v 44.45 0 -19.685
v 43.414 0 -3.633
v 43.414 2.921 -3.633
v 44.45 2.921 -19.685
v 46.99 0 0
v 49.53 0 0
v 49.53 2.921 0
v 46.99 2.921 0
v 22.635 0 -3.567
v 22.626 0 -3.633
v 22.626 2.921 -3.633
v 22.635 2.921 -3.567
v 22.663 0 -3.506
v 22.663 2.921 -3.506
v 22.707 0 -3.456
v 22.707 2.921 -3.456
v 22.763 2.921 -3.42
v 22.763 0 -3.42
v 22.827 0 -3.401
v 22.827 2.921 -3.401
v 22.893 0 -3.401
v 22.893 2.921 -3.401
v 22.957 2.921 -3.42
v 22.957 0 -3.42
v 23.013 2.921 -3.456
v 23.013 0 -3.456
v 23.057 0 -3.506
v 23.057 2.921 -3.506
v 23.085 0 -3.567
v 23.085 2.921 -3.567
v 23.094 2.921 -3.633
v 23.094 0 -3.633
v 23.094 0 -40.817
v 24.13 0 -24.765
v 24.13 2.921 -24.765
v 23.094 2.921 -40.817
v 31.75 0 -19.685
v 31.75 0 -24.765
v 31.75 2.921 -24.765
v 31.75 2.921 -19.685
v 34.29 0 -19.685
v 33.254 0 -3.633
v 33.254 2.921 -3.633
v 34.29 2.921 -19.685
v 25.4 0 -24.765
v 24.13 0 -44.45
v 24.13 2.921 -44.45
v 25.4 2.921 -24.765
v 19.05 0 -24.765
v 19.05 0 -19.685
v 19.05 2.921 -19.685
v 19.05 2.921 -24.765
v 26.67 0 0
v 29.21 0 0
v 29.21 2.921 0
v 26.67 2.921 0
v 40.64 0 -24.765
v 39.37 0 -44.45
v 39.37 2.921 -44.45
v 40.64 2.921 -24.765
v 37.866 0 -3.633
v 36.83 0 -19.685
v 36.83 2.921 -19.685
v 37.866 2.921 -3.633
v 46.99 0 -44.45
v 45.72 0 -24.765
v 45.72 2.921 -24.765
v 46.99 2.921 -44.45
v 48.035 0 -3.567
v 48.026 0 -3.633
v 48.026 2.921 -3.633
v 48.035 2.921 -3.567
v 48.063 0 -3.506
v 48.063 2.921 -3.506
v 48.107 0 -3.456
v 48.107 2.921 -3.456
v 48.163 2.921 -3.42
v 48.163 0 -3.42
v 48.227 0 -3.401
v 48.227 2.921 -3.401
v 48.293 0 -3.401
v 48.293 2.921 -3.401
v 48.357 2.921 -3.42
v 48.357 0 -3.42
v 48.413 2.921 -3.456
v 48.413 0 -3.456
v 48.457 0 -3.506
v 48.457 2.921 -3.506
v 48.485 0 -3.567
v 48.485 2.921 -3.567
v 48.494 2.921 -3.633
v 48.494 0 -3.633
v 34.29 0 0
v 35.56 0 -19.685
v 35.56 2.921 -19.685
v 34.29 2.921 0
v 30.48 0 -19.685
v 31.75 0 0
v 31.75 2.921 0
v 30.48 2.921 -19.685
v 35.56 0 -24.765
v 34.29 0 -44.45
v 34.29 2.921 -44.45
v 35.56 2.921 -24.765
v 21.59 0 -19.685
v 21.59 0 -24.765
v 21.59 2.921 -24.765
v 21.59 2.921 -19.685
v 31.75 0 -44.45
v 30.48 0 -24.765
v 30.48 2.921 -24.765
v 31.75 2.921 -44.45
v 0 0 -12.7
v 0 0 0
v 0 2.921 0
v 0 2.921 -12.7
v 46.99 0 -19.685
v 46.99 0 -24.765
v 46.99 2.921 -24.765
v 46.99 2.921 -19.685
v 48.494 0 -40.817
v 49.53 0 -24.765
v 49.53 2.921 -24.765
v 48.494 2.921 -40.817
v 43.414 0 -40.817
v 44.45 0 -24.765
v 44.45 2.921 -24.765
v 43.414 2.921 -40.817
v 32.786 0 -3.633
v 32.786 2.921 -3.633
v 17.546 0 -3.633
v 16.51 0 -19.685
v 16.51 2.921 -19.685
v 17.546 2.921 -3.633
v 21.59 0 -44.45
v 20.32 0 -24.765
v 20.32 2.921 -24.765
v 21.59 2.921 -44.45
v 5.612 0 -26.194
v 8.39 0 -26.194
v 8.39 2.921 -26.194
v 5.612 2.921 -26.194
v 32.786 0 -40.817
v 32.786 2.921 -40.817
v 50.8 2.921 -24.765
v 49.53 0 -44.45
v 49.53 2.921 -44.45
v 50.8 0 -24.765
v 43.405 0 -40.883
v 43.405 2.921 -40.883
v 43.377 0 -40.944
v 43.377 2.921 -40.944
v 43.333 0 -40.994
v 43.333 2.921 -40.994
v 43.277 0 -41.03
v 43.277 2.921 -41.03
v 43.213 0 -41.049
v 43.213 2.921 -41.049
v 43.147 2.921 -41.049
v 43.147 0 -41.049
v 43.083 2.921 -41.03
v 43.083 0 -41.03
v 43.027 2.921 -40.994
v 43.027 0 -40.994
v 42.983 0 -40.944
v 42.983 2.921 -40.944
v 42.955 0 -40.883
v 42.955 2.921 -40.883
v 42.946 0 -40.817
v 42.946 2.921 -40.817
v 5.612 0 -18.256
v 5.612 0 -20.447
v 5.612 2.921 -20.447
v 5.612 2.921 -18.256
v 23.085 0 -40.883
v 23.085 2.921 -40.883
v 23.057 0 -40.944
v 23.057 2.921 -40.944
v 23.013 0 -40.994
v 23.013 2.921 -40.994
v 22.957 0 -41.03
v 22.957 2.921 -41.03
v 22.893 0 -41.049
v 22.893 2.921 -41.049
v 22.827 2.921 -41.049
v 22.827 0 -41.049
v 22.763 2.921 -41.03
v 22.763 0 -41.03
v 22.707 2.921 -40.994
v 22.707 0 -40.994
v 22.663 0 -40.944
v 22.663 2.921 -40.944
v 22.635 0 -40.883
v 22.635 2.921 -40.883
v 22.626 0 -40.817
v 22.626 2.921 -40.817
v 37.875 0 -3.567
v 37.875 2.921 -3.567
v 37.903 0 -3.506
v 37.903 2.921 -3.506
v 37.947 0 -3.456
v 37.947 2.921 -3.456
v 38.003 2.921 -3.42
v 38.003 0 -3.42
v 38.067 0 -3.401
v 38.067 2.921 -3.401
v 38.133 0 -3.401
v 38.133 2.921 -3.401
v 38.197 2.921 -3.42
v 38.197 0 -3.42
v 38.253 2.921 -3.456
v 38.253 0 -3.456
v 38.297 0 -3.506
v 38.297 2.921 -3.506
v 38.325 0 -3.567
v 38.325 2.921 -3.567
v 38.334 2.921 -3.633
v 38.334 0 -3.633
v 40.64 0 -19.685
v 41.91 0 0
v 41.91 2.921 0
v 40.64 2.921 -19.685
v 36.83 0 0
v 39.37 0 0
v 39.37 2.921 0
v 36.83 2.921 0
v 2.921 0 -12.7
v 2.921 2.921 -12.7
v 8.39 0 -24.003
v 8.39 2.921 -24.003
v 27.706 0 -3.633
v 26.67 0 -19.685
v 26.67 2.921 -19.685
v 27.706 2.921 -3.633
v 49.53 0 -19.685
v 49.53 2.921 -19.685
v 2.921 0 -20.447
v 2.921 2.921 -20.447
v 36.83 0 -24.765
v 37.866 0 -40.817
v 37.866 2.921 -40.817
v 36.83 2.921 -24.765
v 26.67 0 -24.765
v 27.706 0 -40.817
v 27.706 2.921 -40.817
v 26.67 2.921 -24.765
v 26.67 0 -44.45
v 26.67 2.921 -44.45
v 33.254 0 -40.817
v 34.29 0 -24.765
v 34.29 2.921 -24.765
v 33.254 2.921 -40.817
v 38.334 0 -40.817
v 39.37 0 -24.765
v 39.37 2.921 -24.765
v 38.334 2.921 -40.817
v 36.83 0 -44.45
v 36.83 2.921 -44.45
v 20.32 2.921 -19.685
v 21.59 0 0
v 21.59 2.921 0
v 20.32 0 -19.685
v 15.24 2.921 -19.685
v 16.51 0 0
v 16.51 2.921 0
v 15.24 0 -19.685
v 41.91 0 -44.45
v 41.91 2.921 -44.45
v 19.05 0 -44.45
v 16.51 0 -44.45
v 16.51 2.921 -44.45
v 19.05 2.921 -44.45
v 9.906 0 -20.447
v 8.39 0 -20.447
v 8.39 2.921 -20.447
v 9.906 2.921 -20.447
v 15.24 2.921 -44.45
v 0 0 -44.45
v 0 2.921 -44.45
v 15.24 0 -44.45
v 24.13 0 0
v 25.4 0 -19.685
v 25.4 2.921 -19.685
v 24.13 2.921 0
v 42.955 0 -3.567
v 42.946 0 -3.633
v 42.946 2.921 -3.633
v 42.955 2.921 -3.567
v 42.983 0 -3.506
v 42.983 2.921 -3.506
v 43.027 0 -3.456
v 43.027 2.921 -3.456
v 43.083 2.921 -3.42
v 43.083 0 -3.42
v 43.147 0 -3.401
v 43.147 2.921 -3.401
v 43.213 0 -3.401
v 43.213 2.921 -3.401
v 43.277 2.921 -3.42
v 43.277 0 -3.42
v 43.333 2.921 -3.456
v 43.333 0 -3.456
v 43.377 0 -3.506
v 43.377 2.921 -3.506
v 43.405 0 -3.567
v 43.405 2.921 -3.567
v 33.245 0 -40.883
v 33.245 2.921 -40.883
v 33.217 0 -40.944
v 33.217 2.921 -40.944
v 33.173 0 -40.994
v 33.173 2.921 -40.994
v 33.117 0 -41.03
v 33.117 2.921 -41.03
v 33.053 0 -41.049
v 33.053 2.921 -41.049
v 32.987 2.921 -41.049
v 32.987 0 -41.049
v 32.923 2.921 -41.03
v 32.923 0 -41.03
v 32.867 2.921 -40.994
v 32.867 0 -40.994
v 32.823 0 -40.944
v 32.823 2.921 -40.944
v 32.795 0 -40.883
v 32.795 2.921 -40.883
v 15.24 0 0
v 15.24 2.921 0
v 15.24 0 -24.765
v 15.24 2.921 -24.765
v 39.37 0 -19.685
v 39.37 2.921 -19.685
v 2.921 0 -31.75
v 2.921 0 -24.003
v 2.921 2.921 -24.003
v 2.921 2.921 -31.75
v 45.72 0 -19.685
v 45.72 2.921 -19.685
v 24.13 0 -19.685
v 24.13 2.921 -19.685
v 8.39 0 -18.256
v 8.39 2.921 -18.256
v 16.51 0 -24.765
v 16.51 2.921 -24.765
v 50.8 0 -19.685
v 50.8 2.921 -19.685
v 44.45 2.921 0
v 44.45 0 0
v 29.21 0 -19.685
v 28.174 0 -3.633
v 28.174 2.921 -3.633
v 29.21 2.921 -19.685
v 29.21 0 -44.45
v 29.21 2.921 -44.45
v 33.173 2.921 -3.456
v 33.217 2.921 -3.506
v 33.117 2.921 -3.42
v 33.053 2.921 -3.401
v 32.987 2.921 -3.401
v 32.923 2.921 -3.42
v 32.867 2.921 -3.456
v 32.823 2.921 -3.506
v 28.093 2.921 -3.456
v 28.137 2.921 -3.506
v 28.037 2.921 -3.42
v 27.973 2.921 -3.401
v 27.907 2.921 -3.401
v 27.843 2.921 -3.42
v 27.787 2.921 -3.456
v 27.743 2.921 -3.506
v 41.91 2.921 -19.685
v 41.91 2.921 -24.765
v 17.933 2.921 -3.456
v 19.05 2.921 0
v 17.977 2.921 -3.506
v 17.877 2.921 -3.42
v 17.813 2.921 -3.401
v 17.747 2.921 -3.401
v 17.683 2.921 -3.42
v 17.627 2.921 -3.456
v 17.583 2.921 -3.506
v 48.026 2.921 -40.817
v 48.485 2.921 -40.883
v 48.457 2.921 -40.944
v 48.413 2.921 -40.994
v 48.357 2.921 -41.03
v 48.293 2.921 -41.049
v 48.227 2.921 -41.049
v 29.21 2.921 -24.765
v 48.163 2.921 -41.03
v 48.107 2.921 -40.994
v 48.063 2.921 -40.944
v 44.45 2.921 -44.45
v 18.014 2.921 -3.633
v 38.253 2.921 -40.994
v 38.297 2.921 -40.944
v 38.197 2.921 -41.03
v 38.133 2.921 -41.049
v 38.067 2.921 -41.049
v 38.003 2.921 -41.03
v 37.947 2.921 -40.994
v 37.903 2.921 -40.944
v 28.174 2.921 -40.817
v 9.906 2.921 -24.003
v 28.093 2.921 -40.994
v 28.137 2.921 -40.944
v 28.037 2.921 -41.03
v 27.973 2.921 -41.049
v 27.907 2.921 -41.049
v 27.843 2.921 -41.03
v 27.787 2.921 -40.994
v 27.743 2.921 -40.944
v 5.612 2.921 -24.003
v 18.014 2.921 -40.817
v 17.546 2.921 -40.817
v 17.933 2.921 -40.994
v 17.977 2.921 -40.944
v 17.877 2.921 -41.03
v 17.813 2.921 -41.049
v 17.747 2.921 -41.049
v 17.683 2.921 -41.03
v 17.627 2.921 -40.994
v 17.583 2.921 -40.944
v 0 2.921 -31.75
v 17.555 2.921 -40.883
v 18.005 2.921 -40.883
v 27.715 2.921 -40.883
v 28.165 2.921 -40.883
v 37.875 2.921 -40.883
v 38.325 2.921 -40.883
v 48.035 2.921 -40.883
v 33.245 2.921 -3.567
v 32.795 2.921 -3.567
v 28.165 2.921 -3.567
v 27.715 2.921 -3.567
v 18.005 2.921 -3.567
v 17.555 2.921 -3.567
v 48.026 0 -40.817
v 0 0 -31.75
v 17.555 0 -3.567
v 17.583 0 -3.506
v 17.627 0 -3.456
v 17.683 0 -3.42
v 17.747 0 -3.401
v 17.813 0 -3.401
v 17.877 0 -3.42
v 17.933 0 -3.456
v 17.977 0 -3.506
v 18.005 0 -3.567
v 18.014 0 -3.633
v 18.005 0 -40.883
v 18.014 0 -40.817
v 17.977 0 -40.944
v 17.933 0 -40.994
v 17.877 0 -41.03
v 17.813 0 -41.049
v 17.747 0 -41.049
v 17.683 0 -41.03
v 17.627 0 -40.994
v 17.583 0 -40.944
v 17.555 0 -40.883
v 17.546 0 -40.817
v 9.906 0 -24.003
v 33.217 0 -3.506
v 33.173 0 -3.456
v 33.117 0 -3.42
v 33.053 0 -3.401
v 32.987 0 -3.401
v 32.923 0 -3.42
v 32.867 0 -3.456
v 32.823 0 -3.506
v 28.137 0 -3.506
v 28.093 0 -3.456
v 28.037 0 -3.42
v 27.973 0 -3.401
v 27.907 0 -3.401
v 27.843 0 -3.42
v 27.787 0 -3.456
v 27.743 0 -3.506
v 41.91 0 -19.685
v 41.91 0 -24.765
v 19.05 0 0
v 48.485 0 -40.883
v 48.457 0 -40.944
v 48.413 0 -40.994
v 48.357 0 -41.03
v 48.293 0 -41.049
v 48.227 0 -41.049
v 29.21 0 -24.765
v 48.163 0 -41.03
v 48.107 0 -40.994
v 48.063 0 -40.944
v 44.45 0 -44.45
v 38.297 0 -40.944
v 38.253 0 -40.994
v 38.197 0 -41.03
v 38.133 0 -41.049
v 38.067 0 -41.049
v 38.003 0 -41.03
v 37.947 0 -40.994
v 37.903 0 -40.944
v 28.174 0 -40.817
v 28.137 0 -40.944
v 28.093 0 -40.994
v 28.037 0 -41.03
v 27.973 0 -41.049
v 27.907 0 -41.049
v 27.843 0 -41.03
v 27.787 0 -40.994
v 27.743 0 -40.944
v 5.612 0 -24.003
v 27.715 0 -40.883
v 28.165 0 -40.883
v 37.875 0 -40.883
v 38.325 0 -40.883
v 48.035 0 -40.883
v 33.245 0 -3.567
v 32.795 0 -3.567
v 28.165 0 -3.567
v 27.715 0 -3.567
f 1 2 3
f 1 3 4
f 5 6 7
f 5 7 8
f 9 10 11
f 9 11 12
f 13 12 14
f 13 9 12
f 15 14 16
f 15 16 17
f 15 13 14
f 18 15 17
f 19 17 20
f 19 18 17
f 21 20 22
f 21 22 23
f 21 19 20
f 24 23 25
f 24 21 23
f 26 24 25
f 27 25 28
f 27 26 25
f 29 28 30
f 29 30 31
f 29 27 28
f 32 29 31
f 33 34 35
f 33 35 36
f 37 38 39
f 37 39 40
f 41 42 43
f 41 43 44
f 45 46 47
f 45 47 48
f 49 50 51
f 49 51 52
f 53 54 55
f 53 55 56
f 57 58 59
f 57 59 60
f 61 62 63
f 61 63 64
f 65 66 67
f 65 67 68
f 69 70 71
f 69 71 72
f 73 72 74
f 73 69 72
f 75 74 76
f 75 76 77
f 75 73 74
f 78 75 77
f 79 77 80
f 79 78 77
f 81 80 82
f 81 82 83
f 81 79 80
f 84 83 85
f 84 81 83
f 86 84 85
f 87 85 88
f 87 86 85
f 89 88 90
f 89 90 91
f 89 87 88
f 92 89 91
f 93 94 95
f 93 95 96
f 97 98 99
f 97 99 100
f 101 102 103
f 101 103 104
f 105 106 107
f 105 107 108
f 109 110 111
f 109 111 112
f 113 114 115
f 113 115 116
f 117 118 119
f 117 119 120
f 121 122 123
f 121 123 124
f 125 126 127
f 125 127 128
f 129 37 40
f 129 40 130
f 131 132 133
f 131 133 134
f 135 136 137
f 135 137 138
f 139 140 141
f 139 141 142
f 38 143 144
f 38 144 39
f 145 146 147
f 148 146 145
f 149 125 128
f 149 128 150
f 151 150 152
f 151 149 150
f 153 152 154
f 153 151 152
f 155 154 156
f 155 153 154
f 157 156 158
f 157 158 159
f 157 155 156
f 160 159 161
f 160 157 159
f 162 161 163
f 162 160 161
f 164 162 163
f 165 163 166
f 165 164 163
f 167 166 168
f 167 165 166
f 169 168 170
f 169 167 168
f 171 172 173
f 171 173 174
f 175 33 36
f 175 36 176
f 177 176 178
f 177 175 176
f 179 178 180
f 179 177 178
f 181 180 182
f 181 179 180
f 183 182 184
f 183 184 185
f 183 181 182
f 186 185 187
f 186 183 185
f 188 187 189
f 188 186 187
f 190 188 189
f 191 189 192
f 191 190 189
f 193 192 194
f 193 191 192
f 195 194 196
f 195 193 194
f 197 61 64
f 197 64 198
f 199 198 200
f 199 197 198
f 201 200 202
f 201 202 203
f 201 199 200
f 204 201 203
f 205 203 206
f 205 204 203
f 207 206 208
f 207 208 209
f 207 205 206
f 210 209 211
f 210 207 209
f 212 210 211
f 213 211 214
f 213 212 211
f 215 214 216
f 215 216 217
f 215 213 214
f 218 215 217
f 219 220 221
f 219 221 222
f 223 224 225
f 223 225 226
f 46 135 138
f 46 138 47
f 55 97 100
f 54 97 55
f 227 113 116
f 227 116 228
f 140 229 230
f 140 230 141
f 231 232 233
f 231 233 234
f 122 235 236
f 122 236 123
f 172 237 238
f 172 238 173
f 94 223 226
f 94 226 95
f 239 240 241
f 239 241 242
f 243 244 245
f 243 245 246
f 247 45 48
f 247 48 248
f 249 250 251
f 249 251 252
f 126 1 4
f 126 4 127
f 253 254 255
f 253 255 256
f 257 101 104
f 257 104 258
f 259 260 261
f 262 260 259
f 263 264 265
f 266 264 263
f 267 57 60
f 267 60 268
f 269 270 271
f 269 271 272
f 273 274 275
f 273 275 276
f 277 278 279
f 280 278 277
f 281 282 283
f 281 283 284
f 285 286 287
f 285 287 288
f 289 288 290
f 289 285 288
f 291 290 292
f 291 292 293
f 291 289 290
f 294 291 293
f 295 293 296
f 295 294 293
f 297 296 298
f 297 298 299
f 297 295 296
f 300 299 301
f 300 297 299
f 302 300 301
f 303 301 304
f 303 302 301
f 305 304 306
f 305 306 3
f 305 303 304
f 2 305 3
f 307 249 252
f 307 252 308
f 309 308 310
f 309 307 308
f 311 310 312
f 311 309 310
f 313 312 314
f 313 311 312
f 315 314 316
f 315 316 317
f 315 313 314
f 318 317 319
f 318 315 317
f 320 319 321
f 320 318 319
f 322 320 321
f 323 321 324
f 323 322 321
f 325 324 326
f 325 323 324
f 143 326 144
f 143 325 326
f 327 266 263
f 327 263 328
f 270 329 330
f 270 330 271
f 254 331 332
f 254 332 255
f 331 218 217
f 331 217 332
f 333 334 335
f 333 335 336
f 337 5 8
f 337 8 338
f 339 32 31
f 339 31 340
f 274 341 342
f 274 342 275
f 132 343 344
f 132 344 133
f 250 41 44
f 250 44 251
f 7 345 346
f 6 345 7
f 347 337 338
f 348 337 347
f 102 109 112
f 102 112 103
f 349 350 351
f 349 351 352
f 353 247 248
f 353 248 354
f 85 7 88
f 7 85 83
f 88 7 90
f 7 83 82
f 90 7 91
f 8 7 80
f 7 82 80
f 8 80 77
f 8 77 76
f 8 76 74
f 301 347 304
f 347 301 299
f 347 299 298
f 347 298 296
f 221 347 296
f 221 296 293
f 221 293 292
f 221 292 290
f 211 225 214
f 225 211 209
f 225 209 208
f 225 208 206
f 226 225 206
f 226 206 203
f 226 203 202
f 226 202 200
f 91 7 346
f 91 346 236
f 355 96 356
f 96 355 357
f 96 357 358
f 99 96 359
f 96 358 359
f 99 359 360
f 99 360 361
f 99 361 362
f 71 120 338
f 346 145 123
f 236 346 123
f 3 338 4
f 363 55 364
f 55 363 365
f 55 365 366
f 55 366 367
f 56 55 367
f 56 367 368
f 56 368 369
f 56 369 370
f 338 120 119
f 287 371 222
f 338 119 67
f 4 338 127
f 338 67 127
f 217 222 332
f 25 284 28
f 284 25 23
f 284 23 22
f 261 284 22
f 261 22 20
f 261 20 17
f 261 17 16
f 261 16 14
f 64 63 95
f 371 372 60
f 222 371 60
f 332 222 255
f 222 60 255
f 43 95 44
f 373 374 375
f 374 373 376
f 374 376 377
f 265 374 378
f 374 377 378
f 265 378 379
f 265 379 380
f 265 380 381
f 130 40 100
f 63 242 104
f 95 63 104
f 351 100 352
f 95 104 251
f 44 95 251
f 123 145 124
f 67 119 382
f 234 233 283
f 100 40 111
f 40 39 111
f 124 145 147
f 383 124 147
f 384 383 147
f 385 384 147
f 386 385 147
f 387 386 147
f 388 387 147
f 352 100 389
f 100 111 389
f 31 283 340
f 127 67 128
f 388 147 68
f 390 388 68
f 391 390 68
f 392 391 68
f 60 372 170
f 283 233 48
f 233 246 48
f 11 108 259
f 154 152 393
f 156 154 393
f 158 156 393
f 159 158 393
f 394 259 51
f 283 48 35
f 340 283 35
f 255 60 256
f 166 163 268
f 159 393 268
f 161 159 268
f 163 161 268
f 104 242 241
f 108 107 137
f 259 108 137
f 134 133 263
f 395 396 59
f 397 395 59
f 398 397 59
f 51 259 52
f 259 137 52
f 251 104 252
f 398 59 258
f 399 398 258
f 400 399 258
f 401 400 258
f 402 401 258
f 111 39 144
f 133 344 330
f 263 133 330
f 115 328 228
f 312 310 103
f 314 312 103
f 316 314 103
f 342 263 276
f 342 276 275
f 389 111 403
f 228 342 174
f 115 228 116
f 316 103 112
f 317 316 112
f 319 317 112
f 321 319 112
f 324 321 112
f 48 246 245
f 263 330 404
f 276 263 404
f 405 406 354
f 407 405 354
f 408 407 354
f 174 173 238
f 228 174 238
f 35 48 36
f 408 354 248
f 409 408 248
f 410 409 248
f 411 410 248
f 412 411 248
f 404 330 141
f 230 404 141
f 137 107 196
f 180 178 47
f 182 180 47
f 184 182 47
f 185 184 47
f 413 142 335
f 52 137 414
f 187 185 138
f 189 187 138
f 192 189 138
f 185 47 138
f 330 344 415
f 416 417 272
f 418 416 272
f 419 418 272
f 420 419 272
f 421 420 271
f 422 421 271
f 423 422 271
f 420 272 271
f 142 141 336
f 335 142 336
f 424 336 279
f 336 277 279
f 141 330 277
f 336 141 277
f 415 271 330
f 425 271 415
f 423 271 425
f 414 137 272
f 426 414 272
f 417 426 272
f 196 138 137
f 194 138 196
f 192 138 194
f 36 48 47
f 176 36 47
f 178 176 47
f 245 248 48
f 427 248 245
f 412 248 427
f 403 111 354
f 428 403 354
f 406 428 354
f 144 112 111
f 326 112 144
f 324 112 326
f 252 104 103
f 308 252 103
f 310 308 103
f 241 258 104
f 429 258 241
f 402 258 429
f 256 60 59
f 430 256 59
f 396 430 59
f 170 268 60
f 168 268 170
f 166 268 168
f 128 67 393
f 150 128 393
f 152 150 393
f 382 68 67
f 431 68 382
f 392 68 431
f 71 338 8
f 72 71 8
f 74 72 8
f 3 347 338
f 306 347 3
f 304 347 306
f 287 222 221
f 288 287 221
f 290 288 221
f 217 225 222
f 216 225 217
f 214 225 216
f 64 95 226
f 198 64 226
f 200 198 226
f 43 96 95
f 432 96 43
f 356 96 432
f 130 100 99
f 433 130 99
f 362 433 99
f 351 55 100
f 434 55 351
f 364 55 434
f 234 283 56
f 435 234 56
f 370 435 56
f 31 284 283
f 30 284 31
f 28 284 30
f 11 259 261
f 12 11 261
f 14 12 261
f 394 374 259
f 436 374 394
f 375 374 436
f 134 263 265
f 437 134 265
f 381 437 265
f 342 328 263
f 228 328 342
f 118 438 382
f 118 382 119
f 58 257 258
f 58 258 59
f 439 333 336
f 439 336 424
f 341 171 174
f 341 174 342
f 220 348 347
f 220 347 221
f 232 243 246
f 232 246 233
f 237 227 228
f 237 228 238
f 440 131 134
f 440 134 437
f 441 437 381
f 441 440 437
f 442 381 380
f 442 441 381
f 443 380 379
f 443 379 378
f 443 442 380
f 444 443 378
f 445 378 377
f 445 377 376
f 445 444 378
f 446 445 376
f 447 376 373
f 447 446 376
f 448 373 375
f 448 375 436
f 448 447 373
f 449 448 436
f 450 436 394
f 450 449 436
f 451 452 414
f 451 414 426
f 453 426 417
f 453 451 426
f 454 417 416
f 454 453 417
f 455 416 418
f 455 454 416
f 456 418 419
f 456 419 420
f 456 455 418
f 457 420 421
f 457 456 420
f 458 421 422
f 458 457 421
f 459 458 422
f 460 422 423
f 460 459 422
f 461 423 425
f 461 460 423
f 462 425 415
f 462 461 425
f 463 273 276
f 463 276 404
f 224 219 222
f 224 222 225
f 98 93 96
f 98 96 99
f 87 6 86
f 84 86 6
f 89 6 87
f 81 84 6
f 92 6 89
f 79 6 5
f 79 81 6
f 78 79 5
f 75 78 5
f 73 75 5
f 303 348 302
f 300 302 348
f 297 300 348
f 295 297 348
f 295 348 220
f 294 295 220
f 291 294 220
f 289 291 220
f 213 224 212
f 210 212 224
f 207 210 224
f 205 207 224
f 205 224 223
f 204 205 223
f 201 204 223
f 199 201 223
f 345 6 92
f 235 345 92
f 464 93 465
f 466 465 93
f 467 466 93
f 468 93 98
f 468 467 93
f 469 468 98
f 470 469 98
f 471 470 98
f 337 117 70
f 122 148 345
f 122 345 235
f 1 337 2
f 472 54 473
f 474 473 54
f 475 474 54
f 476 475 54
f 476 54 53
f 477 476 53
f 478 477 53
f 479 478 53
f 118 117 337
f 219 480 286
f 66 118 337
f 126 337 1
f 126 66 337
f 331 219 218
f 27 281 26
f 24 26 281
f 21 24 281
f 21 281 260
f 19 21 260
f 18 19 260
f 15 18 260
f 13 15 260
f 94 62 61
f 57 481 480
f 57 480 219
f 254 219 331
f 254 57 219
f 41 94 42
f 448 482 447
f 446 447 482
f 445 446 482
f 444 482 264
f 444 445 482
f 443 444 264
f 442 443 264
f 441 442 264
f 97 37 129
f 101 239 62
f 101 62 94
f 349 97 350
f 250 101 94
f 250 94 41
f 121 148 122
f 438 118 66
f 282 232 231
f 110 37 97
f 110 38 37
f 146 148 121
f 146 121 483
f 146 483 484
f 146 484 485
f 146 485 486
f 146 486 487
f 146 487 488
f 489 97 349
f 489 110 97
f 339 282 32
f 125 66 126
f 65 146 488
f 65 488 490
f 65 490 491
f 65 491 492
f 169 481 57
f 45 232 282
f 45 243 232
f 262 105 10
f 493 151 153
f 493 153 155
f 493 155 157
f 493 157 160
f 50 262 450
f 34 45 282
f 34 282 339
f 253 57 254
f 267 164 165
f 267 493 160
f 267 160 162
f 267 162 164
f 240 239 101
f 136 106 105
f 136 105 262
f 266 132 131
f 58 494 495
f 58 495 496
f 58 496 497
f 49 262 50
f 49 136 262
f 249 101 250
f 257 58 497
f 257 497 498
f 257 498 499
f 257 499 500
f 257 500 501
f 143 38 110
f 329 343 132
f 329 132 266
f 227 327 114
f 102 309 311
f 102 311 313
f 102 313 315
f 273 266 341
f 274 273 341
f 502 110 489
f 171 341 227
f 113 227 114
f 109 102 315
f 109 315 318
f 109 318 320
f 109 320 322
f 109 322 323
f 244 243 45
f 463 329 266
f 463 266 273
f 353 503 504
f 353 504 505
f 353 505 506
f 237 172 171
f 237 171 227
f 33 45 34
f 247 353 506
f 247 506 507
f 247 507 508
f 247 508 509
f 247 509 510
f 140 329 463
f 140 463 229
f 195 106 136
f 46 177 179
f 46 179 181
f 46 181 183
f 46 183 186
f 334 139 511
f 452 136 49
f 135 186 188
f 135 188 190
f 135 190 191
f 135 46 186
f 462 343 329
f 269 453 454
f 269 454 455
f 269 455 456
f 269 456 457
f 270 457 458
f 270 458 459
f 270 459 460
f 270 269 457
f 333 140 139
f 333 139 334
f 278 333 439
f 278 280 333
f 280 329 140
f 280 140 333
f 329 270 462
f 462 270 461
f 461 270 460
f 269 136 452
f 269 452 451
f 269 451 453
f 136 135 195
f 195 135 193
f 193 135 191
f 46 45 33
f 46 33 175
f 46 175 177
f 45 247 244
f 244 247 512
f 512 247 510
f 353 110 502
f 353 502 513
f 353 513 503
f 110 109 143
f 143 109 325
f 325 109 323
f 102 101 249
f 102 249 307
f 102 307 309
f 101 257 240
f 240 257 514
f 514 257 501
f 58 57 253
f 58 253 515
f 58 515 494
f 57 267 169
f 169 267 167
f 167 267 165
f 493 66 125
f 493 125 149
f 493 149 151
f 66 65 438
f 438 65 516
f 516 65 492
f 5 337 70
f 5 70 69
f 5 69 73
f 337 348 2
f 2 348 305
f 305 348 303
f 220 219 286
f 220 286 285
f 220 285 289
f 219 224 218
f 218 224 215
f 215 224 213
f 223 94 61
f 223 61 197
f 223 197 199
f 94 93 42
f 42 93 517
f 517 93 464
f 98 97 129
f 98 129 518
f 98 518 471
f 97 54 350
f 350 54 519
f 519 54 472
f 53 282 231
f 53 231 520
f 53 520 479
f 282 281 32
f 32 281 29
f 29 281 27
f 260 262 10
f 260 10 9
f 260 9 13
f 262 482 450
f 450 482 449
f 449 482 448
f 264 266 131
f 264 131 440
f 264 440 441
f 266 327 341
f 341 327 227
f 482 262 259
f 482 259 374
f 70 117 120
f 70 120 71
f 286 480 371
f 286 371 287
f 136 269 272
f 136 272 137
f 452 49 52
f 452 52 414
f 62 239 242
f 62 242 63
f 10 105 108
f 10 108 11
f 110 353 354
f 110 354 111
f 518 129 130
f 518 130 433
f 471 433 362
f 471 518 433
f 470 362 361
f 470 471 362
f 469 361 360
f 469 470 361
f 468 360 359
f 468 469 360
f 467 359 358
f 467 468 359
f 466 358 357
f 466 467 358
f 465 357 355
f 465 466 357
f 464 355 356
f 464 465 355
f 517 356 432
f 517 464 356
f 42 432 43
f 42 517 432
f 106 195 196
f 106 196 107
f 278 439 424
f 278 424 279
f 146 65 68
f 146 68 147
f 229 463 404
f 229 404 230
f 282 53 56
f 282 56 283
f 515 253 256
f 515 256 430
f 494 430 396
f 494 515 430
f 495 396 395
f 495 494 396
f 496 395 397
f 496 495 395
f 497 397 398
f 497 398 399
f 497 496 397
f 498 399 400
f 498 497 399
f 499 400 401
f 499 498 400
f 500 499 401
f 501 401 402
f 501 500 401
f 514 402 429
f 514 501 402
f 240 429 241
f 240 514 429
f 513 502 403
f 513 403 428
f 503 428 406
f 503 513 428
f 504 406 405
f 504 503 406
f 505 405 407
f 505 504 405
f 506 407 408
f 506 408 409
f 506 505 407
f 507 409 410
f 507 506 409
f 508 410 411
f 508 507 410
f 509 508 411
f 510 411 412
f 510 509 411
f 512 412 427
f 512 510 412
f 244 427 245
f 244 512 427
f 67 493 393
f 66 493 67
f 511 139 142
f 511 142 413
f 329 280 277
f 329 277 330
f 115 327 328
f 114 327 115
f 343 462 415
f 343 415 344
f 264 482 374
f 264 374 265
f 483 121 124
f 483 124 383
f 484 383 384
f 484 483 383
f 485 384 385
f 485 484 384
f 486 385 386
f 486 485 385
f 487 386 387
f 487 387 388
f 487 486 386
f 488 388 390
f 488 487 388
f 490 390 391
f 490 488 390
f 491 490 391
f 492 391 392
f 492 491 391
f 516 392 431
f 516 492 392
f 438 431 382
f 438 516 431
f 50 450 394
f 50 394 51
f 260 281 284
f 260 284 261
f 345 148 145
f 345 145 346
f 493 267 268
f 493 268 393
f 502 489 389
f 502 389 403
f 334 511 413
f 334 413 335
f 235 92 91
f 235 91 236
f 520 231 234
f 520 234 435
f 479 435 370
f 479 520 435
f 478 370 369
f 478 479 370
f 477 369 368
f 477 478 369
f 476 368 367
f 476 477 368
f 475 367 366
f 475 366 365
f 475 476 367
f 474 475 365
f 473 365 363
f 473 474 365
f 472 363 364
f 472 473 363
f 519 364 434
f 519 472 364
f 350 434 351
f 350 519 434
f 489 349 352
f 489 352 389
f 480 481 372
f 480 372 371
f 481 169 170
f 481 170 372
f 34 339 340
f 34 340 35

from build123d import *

# Parameters (mm, degrees)
BOSS_EXTRUDE1_DEPTH = 2.921


with BuildPart() as part:
    # Sketch2 → Boss-Extrude1 (new body)
    with BuildSketch(Plane(origin=(0, 0, 0), x_dir=(1, 0, 0), z_dir=(0, 1, 0))):
        Polygon((0, 12.7), (2.921, 12.7), (2.921, 20.447), (5.612336386, 20.447), (5.612336386, 18.25625), (8.390461386, 18.25625), (8.390461386, 20.447), (9.906, 20.447), (9.906, 24.003), (8.390461386, 24.003), (8.390461386, 26.19375), (5.612336386, 26.19375), (5.612336386, 24.003), (2.921, 24.003), (2.921, 31.75), (0, 31.75), (0, 44.45), (15.24, 44.45), (15.24, 24.765), (16.51, 44.45), (19.05, 44.45), (20.32, 24.765), (21.59, 44.45), (24.13, 44.45), (25.4, 24.765), (26.67, 44.45), (29.21, 44.45), (30.48, 24.765), (31.75, 44.45), (34.29, 44.45), (35.56, 24.765), (36.83, 44.45), (39.37, 44.45), (40.64, 24.765), (41.91, 44.45), (44.45, 44.45), (45.72, 24.765), (46.99, 44.45), (49.53, 44.45), (50.8, 24.765), (50.8, 19.685), (49.53, 0), (46.99, 0), (45.72, 19.685), (44.45, 0), (41.91, 0), (40.64, 19.685), (39.37, 0), (36.83, 0), (35.56, 19.685), (34.29, 0), (31.75, 0), (30.48, 19.685), (29.21, 0), (26.67, 0), (25.4, 19.685), (24.13, 0), (21.59, 0), (20.32, 19.685), (19.05, 0), (16.51, 0), (15.24, 19.685), (15.24, 0), (0, 0), align=None)
        with BuildLine():
            Line((48.025626044, 40.817203674), (46.99, 24.765))
            Line((46.99, 24.765), (46.99, 19.685))
            Line((46.99, 19.685), (48.025626044, 3.632796326))
            ThreePointArc((48.025626044, 3.632796326), (48.26, 3.398422369), (48.494373956, 3.632796326))
            Line((48.494373956, 3.632796326), (49.53, 19.685))
            Line((49.53, 19.685), (49.53, 24.765))
            Line((49.53, 24.765), (48.494373956, 40.817203674))
            ThreePointArc((48.494373956, 40.817203674), (48.26, 41.051577631), (48.025626044, 40.817203674))
        make_face(mode=Mode.SUBTRACT)
        with BuildLine():
            Line((42.945626044, 40.817203674), (41.91, 24.765))
            Line((41.91, 24.765), (41.91, 19.685))
            Line((41.91, 19.685), (42.945626044, 3.632796326))
            ThreePointArc((42.945626044, 3.632796326), (43.18, 3.398422369), (43.414373956, 3.632796326))
            Line((43.414373956, 3.632796326), (44.45, 19.685))
            Line((44.45, 19.685), (44.45, 24.765))
            Line((44.45, 24.765), (43.414373956, 40.817203674))
            ThreePointArc((43.414373956, 40.817203674), (43.18, 41.051577631), (42.945626044, 40.817203674))
        make_face(mode=Mode.SUBTRACT)
        with BuildLine():
            Line((37.865626044, 40.817203674), (36.83, 24.765))
            Line((36.83, 24.765), (36.83, 19.685))
            Line((36.83, 19.685), (37.865626044, 3.632796326))
            ThreePointArc((37.865626044, 3.632796326), (38.1, 3.398422369), (38.334373956, 3.632796326))
            Line((38.334373956, 3.632796326), (39.37, 19.685))
            Line((39.37, 19.685), (39.37, 24.765))
            Line((39.37, 24.765), (38.334373956, 40.817203674))
            ThreePointArc((38.334373956, 40.817203674), (38.1, 41.051577631), (37.865626044, 40.817203674))
        make_face(mode=Mode.SUBTRACT)
        with BuildLine():
            Line((32.785626044, 40.817203674), (31.75, 24.765))
            Line((31.75, 24.765), (31.75, 19.685))
            Line((31.75, 19.685), (32.785626044, 3.632796326))
            ThreePointArc((32.785626044, 3.632796326), (33.02, 3.398422369), (33.254373956, 3.632796326))
            Line((33.254373956, 3.632796326), (34.29, 19.685))
            Line((34.29, 19.685), (34.29, 24.765))
            Line((34.29, 24.765), (33.254373956, 40.817203674))
            ThreePointArc((33.254373956, 40.817203674), (33.02, 41.051577631), (32.785626044, 40.817203674))
        make_face(mode=Mode.SUBTRACT)
        with BuildLine():
            Line((27.705626044, 40.817203674), (26.67, 24.765))
            Line((26.67, 24.765), (26.67, 19.685))
            Line((26.67, 19.685), (27.705626044, 3.632796326))
            ThreePointArc((27.705626044, 3.632796326), (27.94, 3.398422369), (28.174373956, 3.632796326))
            Line((28.174373956, 3.632796326), (29.21, 19.685))
            Line((29.21, 19.685), (29.21, 24.765))
            Line((29.21, 24.765), (28.174373956, 40.817203674))
            ThreePointArc((28.174373956, 40.817203674), (27.94, 41.051577631), (27.705626044, 40.817203674))
        make_face(mode=Mode.SUBTRACT)
        with BuildLine():
            Line((22.625626044, 40.817203674), (21.59, 24.765))
            Line((21.59, 24.765), (21.59, 19.685))
            Line((21.59, 19.685), (22.625626044, 3.632796326))
            ThreePointArc((22.625626044, 3.632796326), (22.86, 3.398422369), (23.094373956, 3.632796326))
            Line((23.094373956, 3.632796326), (24.13, 19.685))
            Line((24.13, 19.685), (24.13, 24.765))
            Line((24.13, 24.765), (23.094373956, 40.817203674))
            ThreePointArc((23.094373956, 40.817203674), (22.86, 41.051577631), (22.625626044, 40.817203674))
        make_face(mode=Mode.SUBTRACT)
        with BuildLine():
            Line((17.545626044, 40.817203674), (16.51, 24.765))
            Line((16.51, 24.765), (16.51, 19.685))
            Line((16.51, 19.685), (17.545626044, 3.632796326))
            ThreePointArc((17.545626044, 3.632796326), (17.78, 3.398422369), (18.014373956, 3.632796326))
            Line((18.014373956, 3.632796326), (19.05, 19.685))
            Line((19.05, 19.685), (19.05, 24.765))
            Line((19.05, 24.765), (18.014373956, 40.817203674))
            ThreePointArc((18.014373956, 40.817203674), (17.78, 41.051577631), (17.545626044, 40.817203674))
        make_face(mode=Mode.SUBTRACT)
    extrude(amount=BOSS_EXTRUDE1_DEPTH)


solid = part.part
